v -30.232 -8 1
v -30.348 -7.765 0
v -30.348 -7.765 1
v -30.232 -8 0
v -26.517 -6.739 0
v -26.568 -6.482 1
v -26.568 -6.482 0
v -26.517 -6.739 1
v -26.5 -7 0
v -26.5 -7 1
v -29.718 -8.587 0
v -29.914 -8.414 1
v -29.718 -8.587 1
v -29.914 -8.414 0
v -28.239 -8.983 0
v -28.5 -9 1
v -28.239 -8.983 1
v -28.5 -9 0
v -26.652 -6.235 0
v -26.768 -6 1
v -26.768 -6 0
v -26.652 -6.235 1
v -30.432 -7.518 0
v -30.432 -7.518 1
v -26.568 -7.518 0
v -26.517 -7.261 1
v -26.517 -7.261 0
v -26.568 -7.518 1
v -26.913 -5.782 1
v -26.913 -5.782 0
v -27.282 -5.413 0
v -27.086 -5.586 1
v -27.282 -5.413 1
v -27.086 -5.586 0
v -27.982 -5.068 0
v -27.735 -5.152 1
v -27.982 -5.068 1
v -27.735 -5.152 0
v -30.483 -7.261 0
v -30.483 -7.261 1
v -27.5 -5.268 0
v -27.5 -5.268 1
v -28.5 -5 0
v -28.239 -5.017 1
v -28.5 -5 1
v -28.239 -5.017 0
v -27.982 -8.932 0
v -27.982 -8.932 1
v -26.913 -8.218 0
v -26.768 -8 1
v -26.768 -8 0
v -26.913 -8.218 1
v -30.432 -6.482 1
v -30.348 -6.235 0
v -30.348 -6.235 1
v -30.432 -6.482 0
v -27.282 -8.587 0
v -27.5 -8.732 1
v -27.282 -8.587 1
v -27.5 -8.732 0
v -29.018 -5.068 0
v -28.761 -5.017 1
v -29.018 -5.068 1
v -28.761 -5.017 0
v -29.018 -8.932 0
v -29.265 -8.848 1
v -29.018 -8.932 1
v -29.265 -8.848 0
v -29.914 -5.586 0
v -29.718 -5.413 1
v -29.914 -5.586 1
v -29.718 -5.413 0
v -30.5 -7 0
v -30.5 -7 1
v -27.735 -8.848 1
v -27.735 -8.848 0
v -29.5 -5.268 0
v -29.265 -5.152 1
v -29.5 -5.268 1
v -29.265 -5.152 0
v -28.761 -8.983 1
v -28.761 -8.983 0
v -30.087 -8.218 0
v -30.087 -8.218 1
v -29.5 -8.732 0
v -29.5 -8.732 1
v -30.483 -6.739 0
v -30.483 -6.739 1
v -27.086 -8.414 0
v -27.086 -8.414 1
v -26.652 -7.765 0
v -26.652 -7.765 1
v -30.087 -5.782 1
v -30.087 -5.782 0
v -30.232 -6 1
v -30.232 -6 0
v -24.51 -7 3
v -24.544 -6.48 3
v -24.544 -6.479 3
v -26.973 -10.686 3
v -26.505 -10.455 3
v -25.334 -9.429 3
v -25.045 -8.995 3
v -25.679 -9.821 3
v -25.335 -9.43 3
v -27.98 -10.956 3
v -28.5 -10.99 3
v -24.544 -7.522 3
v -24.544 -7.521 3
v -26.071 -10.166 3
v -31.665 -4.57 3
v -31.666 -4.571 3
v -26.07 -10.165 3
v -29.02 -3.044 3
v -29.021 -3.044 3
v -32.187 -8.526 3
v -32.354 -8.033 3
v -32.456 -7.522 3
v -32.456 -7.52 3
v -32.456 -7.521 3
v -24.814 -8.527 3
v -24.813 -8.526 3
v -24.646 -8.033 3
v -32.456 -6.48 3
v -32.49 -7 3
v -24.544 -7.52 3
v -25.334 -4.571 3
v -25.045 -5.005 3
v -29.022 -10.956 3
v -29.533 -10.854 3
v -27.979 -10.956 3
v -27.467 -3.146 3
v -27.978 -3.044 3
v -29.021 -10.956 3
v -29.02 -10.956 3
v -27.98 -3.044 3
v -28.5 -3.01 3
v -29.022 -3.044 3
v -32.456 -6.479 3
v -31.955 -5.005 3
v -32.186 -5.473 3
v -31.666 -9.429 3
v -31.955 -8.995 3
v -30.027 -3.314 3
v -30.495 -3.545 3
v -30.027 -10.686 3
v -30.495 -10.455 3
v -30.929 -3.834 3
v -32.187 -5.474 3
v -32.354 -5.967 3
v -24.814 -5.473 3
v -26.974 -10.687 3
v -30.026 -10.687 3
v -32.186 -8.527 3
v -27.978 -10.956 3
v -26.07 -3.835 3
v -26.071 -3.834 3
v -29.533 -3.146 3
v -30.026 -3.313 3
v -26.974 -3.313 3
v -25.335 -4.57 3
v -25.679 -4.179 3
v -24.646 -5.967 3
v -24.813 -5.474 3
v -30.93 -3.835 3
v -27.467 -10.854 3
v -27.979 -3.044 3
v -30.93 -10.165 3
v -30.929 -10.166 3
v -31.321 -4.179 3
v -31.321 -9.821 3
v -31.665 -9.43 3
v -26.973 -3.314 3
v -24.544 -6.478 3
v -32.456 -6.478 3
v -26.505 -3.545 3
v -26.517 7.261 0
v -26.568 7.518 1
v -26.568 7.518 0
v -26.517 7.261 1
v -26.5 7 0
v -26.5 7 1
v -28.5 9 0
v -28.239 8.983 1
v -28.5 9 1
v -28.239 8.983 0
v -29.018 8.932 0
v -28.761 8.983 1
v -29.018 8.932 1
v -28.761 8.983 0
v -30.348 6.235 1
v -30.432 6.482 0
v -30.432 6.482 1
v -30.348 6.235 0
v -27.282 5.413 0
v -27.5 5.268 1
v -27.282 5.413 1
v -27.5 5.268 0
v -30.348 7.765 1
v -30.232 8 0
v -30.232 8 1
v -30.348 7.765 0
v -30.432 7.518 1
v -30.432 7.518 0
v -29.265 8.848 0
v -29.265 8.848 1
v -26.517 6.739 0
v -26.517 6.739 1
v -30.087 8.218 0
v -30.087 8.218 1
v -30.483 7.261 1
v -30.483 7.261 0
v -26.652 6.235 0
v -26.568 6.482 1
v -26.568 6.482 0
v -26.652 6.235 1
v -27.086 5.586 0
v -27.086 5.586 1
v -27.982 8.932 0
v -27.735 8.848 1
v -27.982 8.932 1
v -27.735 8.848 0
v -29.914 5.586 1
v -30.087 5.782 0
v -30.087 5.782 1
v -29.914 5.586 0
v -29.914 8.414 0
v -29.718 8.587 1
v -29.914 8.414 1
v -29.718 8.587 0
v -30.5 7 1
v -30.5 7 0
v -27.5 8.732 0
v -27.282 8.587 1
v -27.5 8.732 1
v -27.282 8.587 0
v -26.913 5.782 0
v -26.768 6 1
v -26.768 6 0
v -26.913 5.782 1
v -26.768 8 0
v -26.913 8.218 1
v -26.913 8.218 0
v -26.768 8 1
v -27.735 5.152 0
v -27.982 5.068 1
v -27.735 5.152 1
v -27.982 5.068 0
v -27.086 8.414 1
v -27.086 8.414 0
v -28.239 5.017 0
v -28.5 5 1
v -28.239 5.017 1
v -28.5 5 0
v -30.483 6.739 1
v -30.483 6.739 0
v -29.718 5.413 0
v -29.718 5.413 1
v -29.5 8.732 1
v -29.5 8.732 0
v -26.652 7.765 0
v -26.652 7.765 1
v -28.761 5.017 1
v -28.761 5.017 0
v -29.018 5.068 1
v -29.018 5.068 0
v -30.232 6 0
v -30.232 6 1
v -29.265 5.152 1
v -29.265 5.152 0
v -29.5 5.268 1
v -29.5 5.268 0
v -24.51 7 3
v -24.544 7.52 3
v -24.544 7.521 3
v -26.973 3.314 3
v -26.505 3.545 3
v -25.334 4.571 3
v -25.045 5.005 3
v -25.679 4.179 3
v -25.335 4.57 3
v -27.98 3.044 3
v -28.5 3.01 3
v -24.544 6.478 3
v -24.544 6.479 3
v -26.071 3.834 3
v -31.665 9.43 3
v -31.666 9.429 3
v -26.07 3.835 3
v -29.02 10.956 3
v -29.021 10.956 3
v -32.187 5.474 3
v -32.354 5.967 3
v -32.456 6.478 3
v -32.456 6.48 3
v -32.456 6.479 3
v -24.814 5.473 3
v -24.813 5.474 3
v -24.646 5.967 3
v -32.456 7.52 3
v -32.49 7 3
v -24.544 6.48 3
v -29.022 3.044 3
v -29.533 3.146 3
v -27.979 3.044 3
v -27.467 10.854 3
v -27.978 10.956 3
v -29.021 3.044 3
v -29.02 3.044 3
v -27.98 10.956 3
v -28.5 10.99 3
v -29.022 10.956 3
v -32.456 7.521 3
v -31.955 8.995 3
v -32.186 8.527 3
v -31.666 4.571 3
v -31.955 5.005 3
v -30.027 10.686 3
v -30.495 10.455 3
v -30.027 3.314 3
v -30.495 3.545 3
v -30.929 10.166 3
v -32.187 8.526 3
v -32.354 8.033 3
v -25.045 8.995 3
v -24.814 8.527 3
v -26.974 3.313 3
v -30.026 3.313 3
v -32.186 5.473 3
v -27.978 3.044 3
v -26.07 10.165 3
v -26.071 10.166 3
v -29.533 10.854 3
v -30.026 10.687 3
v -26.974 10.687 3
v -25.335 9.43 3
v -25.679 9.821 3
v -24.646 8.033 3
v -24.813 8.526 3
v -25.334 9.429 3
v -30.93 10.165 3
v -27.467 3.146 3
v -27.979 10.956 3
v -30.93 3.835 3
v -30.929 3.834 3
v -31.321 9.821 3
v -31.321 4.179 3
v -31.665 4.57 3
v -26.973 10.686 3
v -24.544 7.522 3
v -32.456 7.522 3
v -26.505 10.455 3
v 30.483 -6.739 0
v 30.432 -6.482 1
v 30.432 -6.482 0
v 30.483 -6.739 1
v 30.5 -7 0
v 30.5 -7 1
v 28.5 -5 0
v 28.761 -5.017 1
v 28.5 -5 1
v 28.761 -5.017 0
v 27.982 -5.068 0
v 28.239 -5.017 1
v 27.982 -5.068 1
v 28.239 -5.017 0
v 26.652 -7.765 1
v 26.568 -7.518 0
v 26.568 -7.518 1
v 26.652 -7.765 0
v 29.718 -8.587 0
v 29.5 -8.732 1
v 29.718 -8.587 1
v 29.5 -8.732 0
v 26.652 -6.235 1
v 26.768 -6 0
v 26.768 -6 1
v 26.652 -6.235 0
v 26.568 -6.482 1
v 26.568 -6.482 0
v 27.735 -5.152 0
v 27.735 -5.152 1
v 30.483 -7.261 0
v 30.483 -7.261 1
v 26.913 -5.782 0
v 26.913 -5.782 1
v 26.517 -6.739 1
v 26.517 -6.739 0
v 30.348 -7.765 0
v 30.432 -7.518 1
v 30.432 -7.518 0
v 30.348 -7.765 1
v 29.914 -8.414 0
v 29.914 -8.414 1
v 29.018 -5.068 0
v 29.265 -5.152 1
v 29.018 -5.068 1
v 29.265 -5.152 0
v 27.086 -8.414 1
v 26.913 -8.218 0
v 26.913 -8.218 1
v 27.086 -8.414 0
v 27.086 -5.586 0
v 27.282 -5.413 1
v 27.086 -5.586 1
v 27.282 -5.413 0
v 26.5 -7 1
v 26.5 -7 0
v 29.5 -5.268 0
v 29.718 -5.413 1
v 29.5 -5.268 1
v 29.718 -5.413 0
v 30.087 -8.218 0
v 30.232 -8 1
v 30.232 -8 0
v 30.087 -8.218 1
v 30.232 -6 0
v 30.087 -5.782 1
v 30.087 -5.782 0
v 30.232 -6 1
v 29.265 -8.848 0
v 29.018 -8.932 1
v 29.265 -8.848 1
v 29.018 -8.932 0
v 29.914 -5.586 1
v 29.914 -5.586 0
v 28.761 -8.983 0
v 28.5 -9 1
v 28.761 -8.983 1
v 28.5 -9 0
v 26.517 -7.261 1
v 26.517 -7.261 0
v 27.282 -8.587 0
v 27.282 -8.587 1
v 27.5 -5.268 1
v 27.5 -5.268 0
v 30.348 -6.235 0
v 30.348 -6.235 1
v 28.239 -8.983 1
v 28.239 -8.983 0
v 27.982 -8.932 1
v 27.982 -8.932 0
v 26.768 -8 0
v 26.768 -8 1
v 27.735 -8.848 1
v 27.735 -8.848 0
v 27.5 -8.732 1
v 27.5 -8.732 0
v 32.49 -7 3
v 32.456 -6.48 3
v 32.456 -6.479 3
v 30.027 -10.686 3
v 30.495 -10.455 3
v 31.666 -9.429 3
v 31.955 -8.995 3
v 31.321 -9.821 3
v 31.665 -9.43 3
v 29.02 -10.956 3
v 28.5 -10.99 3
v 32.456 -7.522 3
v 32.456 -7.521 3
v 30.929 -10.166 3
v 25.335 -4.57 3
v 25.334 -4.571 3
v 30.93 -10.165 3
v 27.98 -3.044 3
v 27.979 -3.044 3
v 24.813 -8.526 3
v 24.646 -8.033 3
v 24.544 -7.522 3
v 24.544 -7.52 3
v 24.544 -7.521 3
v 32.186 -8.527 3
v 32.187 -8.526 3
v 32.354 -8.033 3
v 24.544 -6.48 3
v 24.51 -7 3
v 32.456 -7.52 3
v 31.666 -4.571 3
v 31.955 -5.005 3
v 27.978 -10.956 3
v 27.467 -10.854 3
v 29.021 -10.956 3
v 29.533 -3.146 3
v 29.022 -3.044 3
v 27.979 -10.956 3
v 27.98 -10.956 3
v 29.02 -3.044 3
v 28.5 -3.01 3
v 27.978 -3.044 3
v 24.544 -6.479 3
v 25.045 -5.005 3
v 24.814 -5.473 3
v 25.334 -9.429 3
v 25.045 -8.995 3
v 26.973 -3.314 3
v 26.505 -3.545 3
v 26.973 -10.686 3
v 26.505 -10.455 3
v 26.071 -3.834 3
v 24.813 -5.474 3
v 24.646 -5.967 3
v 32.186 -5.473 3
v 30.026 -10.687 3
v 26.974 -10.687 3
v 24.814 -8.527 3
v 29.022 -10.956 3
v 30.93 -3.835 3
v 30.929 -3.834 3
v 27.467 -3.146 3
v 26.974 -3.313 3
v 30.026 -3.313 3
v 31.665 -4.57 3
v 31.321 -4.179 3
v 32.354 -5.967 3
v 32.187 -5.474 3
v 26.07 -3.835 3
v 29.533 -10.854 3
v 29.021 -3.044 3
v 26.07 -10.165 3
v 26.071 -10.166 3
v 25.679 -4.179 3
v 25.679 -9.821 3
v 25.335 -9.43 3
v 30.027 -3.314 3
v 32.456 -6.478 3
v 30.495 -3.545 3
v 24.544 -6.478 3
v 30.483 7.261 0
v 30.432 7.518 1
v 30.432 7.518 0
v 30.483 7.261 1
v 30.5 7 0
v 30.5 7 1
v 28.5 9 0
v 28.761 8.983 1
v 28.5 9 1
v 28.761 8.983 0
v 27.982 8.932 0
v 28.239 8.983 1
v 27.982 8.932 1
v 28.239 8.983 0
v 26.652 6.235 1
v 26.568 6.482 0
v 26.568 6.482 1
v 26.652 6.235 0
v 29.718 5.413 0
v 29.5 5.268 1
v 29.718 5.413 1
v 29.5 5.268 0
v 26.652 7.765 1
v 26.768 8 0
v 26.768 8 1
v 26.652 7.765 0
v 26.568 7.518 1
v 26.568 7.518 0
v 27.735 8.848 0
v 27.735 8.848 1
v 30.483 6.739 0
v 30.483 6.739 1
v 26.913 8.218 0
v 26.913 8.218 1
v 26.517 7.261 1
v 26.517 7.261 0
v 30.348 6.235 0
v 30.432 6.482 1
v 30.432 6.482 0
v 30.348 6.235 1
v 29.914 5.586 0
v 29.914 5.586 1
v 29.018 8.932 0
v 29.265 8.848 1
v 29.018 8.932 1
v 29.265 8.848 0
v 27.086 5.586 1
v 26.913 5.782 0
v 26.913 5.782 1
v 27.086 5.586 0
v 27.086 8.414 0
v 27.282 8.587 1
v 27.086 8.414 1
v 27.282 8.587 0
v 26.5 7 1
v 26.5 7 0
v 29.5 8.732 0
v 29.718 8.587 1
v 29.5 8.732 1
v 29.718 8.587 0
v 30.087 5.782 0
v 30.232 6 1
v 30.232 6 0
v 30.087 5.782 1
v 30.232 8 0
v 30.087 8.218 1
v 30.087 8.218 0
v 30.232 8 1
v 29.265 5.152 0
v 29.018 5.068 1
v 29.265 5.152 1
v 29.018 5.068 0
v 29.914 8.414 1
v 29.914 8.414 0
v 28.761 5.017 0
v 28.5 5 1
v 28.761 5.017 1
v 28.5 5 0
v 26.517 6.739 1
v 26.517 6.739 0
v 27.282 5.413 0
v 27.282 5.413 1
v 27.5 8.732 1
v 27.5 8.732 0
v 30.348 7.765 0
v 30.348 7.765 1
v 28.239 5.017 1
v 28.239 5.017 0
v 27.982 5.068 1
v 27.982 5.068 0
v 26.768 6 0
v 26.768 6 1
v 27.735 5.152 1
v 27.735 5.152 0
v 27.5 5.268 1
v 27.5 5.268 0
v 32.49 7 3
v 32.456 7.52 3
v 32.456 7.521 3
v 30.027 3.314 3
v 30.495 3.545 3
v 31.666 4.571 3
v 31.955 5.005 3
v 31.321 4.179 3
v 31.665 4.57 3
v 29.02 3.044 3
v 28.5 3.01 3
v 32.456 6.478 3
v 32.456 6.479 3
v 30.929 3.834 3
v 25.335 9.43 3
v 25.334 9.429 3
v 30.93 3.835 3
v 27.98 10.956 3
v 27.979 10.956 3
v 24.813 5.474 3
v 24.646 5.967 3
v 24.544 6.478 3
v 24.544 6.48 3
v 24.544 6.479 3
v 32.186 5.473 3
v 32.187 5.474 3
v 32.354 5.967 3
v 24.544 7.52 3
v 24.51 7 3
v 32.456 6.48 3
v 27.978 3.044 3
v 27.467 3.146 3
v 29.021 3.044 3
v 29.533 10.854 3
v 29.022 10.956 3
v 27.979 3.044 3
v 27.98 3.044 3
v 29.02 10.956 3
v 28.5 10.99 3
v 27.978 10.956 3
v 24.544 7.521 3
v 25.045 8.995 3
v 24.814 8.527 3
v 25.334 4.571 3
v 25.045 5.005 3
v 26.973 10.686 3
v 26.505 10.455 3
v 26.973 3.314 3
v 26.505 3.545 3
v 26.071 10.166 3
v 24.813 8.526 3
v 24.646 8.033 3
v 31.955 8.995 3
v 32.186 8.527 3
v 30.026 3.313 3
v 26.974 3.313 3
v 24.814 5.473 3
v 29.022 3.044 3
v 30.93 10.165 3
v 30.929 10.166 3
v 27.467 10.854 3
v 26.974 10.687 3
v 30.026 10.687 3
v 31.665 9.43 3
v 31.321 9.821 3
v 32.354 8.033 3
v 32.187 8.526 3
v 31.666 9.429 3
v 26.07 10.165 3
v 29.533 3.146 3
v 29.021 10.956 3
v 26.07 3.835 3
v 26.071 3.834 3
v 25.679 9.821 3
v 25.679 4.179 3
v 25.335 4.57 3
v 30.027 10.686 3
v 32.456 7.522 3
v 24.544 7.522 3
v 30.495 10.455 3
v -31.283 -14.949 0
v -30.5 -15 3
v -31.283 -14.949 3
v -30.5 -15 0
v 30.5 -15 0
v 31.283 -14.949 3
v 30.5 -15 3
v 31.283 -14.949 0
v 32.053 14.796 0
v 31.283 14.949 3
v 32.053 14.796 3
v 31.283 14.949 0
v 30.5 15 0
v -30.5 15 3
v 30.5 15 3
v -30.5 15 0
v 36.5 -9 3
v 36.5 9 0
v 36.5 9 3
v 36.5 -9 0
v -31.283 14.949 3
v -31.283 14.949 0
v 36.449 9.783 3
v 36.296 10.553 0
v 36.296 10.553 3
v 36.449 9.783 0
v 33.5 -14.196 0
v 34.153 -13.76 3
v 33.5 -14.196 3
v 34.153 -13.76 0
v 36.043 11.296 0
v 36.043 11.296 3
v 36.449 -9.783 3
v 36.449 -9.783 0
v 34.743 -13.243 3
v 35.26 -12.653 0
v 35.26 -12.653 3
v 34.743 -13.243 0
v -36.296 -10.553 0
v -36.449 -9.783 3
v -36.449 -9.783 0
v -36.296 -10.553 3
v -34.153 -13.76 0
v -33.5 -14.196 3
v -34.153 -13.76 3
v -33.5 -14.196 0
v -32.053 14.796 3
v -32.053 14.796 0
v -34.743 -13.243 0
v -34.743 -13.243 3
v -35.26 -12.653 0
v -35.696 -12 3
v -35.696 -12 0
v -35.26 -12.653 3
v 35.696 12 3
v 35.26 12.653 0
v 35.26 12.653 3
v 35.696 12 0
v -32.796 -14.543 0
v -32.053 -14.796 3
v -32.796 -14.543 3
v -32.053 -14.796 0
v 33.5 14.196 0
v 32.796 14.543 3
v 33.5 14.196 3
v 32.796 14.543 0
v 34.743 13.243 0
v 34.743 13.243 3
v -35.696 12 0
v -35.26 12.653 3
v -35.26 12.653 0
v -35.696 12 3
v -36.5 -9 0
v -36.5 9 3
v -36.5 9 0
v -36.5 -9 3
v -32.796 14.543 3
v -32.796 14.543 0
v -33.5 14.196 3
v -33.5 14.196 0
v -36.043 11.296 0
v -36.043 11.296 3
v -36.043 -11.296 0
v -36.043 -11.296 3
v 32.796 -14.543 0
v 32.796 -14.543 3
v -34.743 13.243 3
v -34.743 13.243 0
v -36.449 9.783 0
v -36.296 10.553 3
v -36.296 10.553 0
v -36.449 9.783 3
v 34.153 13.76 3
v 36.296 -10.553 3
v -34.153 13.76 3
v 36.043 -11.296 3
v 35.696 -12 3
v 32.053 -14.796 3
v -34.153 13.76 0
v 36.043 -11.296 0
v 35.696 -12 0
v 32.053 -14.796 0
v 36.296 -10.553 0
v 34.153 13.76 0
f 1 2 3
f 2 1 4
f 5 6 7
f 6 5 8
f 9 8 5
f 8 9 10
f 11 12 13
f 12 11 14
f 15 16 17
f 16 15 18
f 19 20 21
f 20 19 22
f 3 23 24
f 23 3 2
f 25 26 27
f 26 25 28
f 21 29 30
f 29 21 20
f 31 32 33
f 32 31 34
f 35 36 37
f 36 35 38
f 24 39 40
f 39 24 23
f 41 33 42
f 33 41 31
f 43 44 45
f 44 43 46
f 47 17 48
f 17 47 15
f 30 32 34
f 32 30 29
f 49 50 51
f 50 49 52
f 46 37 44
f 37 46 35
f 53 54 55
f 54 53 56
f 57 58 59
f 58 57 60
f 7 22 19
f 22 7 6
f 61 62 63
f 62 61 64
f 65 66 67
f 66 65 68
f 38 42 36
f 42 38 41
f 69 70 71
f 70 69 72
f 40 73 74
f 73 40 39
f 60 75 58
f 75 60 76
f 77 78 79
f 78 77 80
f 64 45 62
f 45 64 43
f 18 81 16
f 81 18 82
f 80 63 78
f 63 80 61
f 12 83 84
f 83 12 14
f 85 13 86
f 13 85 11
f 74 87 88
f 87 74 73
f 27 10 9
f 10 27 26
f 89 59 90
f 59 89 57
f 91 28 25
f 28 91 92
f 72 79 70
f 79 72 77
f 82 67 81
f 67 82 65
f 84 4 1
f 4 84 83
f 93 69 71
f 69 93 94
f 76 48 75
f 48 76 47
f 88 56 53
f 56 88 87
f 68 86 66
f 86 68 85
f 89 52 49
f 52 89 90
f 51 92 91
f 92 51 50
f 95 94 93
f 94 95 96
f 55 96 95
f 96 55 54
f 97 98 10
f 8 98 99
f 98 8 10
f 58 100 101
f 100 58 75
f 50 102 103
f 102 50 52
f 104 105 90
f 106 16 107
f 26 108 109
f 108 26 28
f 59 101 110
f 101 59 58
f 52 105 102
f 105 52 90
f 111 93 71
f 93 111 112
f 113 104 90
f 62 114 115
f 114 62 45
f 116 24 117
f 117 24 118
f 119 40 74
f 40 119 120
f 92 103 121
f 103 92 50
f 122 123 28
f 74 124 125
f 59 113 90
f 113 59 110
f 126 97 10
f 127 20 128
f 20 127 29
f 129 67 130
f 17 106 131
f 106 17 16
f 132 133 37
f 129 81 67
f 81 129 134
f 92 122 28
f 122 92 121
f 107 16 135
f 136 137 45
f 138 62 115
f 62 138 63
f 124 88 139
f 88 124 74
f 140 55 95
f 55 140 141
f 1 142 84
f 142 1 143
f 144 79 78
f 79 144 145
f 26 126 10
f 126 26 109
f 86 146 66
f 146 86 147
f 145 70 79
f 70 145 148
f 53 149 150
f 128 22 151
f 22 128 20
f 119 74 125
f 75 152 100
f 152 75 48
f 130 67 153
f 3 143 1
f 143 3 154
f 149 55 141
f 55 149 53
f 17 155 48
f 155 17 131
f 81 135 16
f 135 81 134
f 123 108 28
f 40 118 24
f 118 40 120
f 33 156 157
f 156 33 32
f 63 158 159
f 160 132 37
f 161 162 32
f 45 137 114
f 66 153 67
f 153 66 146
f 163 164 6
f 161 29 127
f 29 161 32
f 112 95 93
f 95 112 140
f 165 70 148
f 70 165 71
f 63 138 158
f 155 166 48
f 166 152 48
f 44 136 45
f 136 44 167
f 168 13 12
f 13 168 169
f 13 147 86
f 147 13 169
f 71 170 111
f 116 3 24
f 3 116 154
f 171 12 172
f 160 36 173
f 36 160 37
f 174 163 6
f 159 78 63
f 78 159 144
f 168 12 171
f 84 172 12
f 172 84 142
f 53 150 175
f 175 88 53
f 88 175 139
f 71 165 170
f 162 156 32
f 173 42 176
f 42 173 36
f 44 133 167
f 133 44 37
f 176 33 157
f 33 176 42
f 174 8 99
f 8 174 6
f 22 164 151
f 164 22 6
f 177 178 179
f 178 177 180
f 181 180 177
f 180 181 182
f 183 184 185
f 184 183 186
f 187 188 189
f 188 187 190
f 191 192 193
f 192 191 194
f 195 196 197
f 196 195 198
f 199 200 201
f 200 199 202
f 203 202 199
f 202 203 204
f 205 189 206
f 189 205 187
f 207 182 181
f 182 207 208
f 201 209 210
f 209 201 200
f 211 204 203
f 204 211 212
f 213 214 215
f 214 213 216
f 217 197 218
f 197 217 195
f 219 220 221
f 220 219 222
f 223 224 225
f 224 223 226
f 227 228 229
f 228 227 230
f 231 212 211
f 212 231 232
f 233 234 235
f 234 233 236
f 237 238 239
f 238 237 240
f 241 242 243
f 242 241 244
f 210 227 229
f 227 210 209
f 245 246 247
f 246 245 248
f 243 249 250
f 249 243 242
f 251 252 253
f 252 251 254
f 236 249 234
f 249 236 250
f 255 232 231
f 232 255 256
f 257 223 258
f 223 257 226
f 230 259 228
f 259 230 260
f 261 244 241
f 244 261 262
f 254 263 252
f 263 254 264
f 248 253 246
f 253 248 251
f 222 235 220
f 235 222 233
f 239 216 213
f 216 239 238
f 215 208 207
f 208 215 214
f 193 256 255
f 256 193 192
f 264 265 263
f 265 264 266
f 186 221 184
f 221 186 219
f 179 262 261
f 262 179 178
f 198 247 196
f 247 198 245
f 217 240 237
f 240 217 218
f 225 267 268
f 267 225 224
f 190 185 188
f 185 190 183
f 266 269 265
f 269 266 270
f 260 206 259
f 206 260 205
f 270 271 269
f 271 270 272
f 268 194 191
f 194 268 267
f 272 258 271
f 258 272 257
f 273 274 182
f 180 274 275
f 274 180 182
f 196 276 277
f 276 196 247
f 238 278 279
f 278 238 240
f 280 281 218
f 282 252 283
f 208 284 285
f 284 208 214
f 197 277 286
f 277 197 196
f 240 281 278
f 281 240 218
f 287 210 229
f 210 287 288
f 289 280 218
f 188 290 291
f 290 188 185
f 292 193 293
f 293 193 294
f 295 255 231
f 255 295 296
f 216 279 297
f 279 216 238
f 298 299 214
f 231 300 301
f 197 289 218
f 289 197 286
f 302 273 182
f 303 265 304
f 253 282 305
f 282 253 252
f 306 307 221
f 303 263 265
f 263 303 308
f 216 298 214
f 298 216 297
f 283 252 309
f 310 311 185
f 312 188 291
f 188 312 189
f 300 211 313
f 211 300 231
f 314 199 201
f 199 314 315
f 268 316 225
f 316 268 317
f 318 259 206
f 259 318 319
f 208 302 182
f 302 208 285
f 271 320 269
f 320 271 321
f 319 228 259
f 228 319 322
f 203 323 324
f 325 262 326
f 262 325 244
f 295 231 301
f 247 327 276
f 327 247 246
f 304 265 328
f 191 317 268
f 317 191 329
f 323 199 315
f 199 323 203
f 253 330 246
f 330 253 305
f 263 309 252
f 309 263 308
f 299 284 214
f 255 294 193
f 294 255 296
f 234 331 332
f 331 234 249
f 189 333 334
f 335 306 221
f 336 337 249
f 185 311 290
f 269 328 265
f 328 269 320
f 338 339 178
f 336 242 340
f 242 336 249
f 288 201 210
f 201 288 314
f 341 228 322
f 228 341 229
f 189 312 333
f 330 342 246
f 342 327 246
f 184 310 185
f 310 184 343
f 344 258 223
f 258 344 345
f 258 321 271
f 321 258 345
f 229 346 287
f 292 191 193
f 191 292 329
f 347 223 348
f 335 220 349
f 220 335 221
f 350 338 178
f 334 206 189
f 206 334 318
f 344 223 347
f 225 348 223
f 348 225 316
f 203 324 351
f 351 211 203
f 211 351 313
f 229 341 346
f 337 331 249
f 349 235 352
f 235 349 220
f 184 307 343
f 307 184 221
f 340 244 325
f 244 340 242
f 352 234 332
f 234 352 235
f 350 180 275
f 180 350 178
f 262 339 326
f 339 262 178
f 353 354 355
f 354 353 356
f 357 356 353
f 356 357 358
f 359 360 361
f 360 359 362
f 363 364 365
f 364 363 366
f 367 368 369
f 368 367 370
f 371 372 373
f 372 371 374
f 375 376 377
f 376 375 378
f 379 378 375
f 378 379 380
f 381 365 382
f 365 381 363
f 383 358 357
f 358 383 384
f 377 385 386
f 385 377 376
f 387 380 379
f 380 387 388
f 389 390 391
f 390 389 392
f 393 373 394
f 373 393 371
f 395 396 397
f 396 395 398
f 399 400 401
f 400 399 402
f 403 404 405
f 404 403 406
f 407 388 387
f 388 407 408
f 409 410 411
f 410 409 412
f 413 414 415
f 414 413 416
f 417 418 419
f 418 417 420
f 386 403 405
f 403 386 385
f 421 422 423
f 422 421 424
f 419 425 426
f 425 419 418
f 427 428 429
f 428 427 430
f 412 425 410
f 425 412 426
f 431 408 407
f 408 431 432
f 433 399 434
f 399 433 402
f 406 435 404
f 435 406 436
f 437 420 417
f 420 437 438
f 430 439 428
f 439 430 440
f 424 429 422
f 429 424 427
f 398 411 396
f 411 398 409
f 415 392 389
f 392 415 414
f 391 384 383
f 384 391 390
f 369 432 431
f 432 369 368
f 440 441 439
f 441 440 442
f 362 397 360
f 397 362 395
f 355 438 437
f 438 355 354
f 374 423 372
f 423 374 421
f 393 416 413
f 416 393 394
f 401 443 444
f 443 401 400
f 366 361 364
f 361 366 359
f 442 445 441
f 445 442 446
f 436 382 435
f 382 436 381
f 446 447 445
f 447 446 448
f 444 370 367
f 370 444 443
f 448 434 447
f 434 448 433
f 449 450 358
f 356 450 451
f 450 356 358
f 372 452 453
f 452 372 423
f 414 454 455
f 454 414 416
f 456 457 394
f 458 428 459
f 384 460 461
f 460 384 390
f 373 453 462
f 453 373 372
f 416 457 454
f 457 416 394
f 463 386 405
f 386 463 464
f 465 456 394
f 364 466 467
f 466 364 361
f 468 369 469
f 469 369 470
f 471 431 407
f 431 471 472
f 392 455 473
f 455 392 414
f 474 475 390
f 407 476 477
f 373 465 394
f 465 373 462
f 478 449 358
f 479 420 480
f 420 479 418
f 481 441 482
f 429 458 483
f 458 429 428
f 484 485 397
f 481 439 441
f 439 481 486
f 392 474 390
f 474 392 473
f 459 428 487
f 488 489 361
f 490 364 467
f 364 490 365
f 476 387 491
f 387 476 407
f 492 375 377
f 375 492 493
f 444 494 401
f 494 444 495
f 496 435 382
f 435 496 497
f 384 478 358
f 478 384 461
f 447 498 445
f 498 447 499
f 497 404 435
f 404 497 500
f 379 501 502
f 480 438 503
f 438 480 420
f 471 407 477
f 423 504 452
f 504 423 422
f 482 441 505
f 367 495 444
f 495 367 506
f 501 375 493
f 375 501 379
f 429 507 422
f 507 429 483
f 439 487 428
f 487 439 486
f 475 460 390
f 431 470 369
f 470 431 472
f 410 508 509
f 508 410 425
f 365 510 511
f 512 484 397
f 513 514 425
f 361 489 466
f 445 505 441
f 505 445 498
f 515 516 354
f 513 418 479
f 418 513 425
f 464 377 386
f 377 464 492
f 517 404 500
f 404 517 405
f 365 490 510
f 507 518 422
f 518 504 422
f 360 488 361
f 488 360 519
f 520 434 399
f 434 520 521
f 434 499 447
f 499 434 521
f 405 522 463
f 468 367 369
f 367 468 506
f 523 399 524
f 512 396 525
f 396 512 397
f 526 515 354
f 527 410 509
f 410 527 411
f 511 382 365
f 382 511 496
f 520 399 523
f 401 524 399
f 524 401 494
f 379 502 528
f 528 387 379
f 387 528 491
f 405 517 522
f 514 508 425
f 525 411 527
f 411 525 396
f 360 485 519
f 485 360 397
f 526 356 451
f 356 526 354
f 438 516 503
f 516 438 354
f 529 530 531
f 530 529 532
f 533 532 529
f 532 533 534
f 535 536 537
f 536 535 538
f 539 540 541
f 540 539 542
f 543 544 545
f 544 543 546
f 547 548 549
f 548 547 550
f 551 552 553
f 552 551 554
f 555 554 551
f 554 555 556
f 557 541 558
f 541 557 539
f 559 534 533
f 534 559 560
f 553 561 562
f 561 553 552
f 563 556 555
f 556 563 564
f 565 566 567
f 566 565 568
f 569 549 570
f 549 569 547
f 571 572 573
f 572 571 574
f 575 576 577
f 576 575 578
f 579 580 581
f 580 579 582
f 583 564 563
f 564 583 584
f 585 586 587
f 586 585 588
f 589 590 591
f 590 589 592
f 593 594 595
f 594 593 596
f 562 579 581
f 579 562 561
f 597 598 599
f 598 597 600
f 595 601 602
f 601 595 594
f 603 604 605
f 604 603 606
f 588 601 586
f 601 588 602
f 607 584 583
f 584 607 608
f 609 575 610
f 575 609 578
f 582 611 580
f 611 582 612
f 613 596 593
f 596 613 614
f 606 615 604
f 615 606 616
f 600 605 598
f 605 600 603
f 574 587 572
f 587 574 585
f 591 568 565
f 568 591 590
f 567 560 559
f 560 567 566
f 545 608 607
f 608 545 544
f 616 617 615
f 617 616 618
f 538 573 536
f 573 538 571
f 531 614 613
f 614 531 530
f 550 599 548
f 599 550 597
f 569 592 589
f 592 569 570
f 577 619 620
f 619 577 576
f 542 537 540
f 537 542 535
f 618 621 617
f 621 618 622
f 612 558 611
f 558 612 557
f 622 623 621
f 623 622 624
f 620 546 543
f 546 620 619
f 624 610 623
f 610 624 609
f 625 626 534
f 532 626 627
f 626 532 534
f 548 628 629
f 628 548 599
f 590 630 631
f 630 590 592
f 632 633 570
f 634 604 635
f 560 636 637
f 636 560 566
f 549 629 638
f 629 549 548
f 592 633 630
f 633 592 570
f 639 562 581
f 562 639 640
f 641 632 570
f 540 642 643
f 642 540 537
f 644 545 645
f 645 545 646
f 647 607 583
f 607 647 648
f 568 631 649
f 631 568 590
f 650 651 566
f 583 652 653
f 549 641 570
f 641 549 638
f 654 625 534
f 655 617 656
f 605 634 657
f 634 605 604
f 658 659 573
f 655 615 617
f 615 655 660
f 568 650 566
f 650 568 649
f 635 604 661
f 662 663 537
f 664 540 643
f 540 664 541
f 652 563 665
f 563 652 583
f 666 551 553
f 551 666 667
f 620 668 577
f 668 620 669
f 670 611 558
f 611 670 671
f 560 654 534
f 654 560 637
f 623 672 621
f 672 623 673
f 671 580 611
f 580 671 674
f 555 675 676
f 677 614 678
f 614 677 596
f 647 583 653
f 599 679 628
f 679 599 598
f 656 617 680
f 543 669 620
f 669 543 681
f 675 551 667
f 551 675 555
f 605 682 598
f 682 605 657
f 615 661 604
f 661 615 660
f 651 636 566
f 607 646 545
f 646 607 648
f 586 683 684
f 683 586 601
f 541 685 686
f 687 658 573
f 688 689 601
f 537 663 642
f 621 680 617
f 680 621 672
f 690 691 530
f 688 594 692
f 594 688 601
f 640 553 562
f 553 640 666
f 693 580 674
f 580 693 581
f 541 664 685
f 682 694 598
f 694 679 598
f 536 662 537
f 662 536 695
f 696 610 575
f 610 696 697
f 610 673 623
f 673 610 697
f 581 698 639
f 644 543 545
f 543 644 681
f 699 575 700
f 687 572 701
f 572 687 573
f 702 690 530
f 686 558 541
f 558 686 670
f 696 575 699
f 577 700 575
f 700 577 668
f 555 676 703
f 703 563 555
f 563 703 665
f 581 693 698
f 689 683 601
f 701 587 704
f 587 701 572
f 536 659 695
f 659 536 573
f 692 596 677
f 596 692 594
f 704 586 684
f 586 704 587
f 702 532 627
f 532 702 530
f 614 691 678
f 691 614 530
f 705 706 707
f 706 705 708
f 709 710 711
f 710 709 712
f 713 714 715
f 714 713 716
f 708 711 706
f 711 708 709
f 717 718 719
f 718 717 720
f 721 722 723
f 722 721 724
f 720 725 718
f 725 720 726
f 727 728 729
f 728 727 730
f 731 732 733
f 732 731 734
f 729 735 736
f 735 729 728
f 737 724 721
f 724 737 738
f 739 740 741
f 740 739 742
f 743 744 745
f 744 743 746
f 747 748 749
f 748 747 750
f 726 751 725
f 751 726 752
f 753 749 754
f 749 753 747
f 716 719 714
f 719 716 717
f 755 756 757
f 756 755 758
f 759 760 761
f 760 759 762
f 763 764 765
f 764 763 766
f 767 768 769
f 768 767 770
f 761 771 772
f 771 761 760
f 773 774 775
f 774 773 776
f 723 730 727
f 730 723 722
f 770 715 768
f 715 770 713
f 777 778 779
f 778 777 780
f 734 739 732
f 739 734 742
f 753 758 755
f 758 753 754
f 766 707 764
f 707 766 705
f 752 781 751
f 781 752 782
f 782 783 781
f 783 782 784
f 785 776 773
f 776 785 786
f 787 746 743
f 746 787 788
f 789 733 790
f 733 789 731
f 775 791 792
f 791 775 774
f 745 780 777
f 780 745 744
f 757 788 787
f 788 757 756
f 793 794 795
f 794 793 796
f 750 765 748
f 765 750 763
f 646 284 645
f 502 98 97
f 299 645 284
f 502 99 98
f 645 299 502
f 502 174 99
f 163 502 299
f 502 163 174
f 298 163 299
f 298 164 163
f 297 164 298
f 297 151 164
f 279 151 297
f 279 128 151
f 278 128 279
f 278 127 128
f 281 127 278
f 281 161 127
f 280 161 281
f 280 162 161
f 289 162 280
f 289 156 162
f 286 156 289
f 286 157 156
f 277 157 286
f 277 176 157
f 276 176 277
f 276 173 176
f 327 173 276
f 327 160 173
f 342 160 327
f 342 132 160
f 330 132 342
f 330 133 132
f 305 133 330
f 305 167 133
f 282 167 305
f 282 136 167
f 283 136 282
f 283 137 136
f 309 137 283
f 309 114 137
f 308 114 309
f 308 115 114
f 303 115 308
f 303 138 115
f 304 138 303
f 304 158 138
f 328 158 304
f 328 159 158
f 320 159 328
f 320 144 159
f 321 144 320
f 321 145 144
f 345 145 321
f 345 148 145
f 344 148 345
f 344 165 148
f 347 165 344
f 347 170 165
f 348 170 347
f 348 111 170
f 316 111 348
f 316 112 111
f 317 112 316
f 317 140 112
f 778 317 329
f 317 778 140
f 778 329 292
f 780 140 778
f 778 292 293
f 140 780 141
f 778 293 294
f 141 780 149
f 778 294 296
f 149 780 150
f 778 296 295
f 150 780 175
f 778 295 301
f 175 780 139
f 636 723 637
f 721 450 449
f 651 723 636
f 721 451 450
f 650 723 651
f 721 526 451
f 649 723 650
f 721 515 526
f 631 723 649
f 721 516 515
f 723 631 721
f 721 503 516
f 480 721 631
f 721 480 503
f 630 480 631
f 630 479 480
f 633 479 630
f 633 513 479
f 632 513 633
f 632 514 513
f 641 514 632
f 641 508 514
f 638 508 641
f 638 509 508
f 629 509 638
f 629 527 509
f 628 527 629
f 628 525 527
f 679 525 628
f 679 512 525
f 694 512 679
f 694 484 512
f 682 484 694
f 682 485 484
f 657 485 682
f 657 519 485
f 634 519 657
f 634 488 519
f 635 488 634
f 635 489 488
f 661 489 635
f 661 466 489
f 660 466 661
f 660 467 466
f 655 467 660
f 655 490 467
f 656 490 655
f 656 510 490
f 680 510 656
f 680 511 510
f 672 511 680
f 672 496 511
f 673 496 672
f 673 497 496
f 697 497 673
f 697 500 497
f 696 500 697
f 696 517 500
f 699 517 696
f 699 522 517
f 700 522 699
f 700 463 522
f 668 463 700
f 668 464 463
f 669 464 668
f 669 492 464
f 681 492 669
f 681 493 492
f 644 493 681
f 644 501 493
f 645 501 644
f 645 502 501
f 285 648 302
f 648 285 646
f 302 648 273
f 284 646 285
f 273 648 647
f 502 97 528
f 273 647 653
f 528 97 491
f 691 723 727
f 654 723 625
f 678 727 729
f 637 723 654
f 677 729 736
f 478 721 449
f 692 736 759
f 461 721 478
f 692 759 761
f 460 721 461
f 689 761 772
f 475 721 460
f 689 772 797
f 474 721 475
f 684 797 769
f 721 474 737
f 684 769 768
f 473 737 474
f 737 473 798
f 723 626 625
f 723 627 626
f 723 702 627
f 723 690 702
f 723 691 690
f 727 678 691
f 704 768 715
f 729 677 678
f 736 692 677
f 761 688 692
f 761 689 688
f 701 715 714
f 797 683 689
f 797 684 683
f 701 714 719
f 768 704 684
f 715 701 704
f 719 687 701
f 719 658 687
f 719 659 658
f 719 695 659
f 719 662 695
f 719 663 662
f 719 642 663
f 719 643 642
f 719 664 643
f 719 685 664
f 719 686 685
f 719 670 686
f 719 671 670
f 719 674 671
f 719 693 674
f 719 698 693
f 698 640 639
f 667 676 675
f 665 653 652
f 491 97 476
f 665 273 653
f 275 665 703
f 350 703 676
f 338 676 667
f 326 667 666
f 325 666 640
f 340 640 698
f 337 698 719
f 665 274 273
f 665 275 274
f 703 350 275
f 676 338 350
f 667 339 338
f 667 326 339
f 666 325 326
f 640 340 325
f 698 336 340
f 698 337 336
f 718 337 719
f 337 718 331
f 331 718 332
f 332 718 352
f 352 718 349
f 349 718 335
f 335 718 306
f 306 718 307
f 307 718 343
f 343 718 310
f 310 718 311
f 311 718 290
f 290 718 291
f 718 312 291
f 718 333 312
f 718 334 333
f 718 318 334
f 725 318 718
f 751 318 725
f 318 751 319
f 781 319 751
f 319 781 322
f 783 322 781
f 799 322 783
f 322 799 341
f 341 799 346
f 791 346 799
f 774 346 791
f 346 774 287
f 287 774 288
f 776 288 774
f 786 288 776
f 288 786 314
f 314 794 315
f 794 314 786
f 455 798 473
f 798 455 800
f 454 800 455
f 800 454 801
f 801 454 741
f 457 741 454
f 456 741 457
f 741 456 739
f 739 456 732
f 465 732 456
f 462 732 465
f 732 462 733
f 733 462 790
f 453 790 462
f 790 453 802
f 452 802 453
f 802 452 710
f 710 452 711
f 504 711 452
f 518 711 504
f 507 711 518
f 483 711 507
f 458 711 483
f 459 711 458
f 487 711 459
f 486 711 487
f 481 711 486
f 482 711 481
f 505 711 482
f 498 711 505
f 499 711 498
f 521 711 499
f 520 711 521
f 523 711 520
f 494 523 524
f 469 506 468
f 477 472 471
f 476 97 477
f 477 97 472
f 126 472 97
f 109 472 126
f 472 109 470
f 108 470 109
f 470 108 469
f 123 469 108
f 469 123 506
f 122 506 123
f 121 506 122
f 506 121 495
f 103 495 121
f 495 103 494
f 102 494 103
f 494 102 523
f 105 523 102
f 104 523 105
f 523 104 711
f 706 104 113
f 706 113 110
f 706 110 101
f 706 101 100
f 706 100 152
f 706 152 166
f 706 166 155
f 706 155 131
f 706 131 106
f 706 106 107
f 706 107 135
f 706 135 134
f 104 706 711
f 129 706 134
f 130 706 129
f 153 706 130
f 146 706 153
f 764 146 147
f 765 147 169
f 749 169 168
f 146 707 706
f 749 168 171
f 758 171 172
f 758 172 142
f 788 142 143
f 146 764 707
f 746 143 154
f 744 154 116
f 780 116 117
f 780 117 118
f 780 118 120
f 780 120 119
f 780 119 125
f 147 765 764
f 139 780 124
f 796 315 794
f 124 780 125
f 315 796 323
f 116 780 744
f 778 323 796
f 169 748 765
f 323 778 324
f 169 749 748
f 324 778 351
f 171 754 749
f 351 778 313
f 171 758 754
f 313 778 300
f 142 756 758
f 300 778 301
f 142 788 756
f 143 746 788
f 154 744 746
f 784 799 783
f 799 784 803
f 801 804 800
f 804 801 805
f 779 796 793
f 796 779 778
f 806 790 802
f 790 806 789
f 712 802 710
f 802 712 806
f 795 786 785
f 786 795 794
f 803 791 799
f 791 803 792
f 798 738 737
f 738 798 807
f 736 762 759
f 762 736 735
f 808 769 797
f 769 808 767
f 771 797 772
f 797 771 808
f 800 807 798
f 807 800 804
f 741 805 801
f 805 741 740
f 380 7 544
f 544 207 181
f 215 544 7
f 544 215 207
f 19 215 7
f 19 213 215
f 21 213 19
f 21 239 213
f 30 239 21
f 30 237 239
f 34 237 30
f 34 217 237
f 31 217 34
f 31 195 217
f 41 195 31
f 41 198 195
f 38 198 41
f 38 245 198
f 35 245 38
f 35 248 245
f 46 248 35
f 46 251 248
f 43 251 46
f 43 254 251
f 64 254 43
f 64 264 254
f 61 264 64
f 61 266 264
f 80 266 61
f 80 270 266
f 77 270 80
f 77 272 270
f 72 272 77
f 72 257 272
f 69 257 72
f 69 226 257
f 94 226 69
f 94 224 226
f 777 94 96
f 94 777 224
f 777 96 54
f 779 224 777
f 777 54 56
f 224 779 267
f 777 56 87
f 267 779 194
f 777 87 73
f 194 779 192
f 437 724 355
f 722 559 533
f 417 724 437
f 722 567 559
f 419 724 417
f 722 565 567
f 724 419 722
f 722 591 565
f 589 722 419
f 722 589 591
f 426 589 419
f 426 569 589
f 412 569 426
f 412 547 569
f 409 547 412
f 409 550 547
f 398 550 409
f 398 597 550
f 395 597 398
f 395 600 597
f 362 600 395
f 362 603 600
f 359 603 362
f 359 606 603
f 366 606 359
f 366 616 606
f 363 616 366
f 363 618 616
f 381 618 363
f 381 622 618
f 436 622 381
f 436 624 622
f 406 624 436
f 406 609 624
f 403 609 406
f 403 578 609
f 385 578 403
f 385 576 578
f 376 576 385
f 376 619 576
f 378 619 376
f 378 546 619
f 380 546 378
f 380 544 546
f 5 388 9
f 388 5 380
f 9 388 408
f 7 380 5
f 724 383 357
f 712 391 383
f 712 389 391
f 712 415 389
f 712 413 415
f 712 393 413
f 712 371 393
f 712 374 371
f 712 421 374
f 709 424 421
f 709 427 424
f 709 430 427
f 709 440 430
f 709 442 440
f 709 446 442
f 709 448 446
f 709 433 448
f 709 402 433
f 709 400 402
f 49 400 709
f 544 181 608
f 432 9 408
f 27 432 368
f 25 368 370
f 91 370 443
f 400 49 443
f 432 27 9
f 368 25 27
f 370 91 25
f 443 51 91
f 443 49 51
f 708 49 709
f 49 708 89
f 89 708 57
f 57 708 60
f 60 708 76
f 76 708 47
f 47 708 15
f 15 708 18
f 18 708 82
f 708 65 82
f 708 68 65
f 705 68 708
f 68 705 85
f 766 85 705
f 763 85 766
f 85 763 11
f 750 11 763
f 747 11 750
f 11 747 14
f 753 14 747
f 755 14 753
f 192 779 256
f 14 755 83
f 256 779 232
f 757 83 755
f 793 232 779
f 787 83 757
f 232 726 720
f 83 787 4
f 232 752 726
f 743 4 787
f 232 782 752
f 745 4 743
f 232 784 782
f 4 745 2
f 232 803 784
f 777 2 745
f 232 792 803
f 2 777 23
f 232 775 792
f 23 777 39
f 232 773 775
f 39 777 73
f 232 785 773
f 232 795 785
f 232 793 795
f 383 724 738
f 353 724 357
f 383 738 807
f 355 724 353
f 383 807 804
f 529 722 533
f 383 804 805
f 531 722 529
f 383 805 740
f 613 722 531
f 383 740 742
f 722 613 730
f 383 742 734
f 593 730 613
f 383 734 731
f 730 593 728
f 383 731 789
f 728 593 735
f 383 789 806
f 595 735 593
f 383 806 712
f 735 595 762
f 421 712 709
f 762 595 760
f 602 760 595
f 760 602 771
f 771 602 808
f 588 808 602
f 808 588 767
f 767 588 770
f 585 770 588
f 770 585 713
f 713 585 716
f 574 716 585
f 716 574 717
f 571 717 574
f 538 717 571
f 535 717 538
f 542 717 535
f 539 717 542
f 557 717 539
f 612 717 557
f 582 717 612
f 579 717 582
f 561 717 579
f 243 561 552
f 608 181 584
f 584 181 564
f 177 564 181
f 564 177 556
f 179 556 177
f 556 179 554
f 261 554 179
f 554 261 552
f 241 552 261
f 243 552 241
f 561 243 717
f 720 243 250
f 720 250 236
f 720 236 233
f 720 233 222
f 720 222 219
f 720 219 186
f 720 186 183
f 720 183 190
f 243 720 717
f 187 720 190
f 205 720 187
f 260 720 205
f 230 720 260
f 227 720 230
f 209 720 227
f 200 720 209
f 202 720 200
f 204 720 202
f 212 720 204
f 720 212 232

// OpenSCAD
// Rounded mounting plate - a flat plate with rounded corners and a countersunk screw hole near each
// corner. Teaches 2D corner rounding with offset() and a countersink (chamfered hole). NOVEL part.
//
// @desc flat plate, rounded corners, countersunk holes
// @prompt Design a mounting plate in OpenSCAD: {L} by {W} mm and {t} mm thick, with {r} mm rounded corners and a countersunk hole for an {screw} mm screw near each corner. Reply with a single complete OpenSCAD file.
// @param L     length, mm           [40:120]
// @param W     width, mm            [30:90]
// @param t     thickness, mm        [3:8]
// @param r     corner radius, mm    [3:12]
// @param screw screw diameter, mm   [3:6]

L     = 73;
W     = 30;
t     = 3;
r     = 6;
screw = 4;

$fn = 48;

inset = r + 2;                     // hole-centre inset from the edges
head  = screw * 2;                 // countersink top diameter
csk   = min(screw, t - 1);         // countersink depth

module rounded_rect(l, w, rad) {
    offset(r = rad) square([l - 2 * rad, w - 2 * rad], center = true);
}

difference() {
    linear_extrude(t) rounded_rect(L, W, r);
    for (sx = [-1, 1], sy = [-1, 1])
        translate([sx * (L / 2 - inset), sy * (W / 2 - inset), 0]) {
            translate([0, 0, -1]) cylinder(h = t + 2, d = screw);                       // shank
            translate([0, 0, t - csk]) cylinder(h = csk + 0.01, d1 = screw, d2 = head); // countersink
        }
}
